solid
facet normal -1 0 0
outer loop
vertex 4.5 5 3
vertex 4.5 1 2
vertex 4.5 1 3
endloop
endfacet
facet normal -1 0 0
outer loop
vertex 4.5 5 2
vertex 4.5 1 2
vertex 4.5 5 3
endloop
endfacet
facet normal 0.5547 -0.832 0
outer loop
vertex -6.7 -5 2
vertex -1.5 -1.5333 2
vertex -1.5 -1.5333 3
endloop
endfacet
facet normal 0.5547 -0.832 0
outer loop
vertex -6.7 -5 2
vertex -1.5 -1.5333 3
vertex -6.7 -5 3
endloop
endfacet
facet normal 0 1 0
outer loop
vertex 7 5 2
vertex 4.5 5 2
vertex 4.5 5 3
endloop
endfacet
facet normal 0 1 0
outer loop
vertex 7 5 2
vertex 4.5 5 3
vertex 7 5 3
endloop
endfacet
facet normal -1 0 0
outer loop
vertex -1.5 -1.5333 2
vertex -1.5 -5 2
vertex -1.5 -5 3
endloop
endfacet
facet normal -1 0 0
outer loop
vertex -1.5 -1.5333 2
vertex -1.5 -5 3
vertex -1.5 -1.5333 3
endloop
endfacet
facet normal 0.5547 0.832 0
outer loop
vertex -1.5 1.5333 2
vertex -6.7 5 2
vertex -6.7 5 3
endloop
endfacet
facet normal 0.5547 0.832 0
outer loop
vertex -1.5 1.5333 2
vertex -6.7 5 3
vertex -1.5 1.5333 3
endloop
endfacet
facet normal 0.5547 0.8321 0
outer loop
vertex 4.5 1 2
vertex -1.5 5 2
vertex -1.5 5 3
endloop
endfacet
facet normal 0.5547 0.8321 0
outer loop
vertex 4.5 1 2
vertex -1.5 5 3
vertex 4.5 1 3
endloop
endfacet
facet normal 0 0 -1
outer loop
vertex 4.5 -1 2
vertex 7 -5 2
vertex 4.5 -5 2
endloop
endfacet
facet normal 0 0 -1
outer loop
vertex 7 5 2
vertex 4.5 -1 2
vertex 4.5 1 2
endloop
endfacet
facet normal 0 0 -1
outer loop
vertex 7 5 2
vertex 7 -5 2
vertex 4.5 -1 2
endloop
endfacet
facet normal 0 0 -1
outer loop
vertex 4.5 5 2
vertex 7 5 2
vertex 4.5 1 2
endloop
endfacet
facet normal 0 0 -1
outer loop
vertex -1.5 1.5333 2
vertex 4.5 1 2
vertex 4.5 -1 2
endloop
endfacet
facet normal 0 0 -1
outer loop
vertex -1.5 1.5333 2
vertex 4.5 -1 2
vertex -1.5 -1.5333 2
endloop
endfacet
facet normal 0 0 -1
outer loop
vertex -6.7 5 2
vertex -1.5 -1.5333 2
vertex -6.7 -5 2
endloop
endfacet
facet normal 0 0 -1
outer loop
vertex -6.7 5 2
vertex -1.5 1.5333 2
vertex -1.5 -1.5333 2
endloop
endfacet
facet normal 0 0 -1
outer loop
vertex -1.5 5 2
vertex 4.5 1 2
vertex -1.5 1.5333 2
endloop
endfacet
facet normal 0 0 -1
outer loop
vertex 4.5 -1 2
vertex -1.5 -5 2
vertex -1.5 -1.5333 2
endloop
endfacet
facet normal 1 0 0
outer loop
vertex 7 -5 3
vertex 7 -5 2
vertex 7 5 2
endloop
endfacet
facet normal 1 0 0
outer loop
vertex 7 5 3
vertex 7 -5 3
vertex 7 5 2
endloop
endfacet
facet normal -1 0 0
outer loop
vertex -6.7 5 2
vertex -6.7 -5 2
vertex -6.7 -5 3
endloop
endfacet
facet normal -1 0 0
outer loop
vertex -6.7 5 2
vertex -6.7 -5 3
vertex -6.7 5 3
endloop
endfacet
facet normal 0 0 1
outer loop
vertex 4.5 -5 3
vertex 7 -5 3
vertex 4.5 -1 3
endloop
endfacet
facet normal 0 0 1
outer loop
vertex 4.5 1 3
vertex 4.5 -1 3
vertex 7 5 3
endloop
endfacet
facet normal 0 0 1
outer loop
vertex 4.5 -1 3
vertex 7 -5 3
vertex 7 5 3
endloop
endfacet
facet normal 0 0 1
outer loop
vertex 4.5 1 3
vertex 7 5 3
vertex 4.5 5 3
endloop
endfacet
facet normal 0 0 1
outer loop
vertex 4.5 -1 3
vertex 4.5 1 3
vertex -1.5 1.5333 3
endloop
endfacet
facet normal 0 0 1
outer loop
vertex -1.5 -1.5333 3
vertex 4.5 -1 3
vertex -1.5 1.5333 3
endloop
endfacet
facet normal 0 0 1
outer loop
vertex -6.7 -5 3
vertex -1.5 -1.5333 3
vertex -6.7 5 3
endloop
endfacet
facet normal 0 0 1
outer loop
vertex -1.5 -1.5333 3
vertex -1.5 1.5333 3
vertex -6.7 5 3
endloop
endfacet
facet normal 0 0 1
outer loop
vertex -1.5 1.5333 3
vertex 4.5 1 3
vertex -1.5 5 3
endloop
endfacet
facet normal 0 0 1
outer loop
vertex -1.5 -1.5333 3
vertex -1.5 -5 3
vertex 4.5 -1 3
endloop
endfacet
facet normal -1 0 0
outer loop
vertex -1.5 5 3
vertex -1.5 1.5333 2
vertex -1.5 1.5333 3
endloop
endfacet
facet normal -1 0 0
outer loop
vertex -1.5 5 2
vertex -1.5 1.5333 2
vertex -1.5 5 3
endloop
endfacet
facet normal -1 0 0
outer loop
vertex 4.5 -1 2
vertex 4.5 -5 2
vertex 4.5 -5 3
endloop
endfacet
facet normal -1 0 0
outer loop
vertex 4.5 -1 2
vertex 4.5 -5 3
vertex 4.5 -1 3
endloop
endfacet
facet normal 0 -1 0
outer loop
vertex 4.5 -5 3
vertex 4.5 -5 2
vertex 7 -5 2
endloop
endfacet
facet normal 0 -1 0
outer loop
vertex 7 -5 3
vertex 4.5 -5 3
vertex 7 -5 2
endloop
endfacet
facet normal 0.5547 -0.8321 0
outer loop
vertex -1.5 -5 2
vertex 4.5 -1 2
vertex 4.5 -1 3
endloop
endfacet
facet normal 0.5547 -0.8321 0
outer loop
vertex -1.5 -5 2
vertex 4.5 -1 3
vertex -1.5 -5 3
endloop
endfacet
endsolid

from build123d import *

# Parameters (mm, degrees)
PAD003_DEPTH = 1
PAD004_DEPTH = 1
SKETCH010_W  = 2.5
SKETCH010_H  = 10
PAD005_DEPTH = 1


with BuildPart() as pfeil_rechts2:
    # Sketch012 → Pad003 (new body)
    with BuildSketch(Plane.XY):
        Polygon((-4.5, 5), (3, 0), (-4.5, -5), align=None)
    extrude(amount=PAD003_DEPTH)


with BuildPart() as pfeil_rechts2_1:
    # Body005 placement: moved
    add(pfeil_rechts2.part.moved(Location((-2.2, 0, 2))))


with BuildPart() as pfeil_rechts003:
    # Sketch011 → Pad004 (new body)
    with BuildSketch(Plane(origin=(1, 0, 0), x_dir=(1, 0, 0), z_dir=(0, 0, 1))):
        Polygon((-4.5, 5), (3, 0), (-4.5, -5), align=None)
    extrude(amount=PAD004_DEPTH)


with BuildPart() as pfeil_rechts003_1:
    # Body006 placement: moved
    add(pfeil_rechts003.part.moved(Location((2, 0, 2))))


with BuildPart() as bild_ff:
    # Sketch010 → Pad005 (new body)
    with BuildSketch(Plane.XY):
        with Locations((-4.45, 0)):
            Rectangle(SKETCH010_W, SKETCH010_H)
    extrude(amount=PAD005_DEPTH)


with BuildPart() as bild_ff_1:
    # Body007 placement: moved
    add(bild_ff.part.moved(Location((10.2, 0, 2))))

    # Fusion002: union Pfeil rechts2, Pfeil rechts003
    add(pfeil_rechts2_1.part)
    add(pfeil_rechts003_1.part)


solid = bild_ff_1.part
